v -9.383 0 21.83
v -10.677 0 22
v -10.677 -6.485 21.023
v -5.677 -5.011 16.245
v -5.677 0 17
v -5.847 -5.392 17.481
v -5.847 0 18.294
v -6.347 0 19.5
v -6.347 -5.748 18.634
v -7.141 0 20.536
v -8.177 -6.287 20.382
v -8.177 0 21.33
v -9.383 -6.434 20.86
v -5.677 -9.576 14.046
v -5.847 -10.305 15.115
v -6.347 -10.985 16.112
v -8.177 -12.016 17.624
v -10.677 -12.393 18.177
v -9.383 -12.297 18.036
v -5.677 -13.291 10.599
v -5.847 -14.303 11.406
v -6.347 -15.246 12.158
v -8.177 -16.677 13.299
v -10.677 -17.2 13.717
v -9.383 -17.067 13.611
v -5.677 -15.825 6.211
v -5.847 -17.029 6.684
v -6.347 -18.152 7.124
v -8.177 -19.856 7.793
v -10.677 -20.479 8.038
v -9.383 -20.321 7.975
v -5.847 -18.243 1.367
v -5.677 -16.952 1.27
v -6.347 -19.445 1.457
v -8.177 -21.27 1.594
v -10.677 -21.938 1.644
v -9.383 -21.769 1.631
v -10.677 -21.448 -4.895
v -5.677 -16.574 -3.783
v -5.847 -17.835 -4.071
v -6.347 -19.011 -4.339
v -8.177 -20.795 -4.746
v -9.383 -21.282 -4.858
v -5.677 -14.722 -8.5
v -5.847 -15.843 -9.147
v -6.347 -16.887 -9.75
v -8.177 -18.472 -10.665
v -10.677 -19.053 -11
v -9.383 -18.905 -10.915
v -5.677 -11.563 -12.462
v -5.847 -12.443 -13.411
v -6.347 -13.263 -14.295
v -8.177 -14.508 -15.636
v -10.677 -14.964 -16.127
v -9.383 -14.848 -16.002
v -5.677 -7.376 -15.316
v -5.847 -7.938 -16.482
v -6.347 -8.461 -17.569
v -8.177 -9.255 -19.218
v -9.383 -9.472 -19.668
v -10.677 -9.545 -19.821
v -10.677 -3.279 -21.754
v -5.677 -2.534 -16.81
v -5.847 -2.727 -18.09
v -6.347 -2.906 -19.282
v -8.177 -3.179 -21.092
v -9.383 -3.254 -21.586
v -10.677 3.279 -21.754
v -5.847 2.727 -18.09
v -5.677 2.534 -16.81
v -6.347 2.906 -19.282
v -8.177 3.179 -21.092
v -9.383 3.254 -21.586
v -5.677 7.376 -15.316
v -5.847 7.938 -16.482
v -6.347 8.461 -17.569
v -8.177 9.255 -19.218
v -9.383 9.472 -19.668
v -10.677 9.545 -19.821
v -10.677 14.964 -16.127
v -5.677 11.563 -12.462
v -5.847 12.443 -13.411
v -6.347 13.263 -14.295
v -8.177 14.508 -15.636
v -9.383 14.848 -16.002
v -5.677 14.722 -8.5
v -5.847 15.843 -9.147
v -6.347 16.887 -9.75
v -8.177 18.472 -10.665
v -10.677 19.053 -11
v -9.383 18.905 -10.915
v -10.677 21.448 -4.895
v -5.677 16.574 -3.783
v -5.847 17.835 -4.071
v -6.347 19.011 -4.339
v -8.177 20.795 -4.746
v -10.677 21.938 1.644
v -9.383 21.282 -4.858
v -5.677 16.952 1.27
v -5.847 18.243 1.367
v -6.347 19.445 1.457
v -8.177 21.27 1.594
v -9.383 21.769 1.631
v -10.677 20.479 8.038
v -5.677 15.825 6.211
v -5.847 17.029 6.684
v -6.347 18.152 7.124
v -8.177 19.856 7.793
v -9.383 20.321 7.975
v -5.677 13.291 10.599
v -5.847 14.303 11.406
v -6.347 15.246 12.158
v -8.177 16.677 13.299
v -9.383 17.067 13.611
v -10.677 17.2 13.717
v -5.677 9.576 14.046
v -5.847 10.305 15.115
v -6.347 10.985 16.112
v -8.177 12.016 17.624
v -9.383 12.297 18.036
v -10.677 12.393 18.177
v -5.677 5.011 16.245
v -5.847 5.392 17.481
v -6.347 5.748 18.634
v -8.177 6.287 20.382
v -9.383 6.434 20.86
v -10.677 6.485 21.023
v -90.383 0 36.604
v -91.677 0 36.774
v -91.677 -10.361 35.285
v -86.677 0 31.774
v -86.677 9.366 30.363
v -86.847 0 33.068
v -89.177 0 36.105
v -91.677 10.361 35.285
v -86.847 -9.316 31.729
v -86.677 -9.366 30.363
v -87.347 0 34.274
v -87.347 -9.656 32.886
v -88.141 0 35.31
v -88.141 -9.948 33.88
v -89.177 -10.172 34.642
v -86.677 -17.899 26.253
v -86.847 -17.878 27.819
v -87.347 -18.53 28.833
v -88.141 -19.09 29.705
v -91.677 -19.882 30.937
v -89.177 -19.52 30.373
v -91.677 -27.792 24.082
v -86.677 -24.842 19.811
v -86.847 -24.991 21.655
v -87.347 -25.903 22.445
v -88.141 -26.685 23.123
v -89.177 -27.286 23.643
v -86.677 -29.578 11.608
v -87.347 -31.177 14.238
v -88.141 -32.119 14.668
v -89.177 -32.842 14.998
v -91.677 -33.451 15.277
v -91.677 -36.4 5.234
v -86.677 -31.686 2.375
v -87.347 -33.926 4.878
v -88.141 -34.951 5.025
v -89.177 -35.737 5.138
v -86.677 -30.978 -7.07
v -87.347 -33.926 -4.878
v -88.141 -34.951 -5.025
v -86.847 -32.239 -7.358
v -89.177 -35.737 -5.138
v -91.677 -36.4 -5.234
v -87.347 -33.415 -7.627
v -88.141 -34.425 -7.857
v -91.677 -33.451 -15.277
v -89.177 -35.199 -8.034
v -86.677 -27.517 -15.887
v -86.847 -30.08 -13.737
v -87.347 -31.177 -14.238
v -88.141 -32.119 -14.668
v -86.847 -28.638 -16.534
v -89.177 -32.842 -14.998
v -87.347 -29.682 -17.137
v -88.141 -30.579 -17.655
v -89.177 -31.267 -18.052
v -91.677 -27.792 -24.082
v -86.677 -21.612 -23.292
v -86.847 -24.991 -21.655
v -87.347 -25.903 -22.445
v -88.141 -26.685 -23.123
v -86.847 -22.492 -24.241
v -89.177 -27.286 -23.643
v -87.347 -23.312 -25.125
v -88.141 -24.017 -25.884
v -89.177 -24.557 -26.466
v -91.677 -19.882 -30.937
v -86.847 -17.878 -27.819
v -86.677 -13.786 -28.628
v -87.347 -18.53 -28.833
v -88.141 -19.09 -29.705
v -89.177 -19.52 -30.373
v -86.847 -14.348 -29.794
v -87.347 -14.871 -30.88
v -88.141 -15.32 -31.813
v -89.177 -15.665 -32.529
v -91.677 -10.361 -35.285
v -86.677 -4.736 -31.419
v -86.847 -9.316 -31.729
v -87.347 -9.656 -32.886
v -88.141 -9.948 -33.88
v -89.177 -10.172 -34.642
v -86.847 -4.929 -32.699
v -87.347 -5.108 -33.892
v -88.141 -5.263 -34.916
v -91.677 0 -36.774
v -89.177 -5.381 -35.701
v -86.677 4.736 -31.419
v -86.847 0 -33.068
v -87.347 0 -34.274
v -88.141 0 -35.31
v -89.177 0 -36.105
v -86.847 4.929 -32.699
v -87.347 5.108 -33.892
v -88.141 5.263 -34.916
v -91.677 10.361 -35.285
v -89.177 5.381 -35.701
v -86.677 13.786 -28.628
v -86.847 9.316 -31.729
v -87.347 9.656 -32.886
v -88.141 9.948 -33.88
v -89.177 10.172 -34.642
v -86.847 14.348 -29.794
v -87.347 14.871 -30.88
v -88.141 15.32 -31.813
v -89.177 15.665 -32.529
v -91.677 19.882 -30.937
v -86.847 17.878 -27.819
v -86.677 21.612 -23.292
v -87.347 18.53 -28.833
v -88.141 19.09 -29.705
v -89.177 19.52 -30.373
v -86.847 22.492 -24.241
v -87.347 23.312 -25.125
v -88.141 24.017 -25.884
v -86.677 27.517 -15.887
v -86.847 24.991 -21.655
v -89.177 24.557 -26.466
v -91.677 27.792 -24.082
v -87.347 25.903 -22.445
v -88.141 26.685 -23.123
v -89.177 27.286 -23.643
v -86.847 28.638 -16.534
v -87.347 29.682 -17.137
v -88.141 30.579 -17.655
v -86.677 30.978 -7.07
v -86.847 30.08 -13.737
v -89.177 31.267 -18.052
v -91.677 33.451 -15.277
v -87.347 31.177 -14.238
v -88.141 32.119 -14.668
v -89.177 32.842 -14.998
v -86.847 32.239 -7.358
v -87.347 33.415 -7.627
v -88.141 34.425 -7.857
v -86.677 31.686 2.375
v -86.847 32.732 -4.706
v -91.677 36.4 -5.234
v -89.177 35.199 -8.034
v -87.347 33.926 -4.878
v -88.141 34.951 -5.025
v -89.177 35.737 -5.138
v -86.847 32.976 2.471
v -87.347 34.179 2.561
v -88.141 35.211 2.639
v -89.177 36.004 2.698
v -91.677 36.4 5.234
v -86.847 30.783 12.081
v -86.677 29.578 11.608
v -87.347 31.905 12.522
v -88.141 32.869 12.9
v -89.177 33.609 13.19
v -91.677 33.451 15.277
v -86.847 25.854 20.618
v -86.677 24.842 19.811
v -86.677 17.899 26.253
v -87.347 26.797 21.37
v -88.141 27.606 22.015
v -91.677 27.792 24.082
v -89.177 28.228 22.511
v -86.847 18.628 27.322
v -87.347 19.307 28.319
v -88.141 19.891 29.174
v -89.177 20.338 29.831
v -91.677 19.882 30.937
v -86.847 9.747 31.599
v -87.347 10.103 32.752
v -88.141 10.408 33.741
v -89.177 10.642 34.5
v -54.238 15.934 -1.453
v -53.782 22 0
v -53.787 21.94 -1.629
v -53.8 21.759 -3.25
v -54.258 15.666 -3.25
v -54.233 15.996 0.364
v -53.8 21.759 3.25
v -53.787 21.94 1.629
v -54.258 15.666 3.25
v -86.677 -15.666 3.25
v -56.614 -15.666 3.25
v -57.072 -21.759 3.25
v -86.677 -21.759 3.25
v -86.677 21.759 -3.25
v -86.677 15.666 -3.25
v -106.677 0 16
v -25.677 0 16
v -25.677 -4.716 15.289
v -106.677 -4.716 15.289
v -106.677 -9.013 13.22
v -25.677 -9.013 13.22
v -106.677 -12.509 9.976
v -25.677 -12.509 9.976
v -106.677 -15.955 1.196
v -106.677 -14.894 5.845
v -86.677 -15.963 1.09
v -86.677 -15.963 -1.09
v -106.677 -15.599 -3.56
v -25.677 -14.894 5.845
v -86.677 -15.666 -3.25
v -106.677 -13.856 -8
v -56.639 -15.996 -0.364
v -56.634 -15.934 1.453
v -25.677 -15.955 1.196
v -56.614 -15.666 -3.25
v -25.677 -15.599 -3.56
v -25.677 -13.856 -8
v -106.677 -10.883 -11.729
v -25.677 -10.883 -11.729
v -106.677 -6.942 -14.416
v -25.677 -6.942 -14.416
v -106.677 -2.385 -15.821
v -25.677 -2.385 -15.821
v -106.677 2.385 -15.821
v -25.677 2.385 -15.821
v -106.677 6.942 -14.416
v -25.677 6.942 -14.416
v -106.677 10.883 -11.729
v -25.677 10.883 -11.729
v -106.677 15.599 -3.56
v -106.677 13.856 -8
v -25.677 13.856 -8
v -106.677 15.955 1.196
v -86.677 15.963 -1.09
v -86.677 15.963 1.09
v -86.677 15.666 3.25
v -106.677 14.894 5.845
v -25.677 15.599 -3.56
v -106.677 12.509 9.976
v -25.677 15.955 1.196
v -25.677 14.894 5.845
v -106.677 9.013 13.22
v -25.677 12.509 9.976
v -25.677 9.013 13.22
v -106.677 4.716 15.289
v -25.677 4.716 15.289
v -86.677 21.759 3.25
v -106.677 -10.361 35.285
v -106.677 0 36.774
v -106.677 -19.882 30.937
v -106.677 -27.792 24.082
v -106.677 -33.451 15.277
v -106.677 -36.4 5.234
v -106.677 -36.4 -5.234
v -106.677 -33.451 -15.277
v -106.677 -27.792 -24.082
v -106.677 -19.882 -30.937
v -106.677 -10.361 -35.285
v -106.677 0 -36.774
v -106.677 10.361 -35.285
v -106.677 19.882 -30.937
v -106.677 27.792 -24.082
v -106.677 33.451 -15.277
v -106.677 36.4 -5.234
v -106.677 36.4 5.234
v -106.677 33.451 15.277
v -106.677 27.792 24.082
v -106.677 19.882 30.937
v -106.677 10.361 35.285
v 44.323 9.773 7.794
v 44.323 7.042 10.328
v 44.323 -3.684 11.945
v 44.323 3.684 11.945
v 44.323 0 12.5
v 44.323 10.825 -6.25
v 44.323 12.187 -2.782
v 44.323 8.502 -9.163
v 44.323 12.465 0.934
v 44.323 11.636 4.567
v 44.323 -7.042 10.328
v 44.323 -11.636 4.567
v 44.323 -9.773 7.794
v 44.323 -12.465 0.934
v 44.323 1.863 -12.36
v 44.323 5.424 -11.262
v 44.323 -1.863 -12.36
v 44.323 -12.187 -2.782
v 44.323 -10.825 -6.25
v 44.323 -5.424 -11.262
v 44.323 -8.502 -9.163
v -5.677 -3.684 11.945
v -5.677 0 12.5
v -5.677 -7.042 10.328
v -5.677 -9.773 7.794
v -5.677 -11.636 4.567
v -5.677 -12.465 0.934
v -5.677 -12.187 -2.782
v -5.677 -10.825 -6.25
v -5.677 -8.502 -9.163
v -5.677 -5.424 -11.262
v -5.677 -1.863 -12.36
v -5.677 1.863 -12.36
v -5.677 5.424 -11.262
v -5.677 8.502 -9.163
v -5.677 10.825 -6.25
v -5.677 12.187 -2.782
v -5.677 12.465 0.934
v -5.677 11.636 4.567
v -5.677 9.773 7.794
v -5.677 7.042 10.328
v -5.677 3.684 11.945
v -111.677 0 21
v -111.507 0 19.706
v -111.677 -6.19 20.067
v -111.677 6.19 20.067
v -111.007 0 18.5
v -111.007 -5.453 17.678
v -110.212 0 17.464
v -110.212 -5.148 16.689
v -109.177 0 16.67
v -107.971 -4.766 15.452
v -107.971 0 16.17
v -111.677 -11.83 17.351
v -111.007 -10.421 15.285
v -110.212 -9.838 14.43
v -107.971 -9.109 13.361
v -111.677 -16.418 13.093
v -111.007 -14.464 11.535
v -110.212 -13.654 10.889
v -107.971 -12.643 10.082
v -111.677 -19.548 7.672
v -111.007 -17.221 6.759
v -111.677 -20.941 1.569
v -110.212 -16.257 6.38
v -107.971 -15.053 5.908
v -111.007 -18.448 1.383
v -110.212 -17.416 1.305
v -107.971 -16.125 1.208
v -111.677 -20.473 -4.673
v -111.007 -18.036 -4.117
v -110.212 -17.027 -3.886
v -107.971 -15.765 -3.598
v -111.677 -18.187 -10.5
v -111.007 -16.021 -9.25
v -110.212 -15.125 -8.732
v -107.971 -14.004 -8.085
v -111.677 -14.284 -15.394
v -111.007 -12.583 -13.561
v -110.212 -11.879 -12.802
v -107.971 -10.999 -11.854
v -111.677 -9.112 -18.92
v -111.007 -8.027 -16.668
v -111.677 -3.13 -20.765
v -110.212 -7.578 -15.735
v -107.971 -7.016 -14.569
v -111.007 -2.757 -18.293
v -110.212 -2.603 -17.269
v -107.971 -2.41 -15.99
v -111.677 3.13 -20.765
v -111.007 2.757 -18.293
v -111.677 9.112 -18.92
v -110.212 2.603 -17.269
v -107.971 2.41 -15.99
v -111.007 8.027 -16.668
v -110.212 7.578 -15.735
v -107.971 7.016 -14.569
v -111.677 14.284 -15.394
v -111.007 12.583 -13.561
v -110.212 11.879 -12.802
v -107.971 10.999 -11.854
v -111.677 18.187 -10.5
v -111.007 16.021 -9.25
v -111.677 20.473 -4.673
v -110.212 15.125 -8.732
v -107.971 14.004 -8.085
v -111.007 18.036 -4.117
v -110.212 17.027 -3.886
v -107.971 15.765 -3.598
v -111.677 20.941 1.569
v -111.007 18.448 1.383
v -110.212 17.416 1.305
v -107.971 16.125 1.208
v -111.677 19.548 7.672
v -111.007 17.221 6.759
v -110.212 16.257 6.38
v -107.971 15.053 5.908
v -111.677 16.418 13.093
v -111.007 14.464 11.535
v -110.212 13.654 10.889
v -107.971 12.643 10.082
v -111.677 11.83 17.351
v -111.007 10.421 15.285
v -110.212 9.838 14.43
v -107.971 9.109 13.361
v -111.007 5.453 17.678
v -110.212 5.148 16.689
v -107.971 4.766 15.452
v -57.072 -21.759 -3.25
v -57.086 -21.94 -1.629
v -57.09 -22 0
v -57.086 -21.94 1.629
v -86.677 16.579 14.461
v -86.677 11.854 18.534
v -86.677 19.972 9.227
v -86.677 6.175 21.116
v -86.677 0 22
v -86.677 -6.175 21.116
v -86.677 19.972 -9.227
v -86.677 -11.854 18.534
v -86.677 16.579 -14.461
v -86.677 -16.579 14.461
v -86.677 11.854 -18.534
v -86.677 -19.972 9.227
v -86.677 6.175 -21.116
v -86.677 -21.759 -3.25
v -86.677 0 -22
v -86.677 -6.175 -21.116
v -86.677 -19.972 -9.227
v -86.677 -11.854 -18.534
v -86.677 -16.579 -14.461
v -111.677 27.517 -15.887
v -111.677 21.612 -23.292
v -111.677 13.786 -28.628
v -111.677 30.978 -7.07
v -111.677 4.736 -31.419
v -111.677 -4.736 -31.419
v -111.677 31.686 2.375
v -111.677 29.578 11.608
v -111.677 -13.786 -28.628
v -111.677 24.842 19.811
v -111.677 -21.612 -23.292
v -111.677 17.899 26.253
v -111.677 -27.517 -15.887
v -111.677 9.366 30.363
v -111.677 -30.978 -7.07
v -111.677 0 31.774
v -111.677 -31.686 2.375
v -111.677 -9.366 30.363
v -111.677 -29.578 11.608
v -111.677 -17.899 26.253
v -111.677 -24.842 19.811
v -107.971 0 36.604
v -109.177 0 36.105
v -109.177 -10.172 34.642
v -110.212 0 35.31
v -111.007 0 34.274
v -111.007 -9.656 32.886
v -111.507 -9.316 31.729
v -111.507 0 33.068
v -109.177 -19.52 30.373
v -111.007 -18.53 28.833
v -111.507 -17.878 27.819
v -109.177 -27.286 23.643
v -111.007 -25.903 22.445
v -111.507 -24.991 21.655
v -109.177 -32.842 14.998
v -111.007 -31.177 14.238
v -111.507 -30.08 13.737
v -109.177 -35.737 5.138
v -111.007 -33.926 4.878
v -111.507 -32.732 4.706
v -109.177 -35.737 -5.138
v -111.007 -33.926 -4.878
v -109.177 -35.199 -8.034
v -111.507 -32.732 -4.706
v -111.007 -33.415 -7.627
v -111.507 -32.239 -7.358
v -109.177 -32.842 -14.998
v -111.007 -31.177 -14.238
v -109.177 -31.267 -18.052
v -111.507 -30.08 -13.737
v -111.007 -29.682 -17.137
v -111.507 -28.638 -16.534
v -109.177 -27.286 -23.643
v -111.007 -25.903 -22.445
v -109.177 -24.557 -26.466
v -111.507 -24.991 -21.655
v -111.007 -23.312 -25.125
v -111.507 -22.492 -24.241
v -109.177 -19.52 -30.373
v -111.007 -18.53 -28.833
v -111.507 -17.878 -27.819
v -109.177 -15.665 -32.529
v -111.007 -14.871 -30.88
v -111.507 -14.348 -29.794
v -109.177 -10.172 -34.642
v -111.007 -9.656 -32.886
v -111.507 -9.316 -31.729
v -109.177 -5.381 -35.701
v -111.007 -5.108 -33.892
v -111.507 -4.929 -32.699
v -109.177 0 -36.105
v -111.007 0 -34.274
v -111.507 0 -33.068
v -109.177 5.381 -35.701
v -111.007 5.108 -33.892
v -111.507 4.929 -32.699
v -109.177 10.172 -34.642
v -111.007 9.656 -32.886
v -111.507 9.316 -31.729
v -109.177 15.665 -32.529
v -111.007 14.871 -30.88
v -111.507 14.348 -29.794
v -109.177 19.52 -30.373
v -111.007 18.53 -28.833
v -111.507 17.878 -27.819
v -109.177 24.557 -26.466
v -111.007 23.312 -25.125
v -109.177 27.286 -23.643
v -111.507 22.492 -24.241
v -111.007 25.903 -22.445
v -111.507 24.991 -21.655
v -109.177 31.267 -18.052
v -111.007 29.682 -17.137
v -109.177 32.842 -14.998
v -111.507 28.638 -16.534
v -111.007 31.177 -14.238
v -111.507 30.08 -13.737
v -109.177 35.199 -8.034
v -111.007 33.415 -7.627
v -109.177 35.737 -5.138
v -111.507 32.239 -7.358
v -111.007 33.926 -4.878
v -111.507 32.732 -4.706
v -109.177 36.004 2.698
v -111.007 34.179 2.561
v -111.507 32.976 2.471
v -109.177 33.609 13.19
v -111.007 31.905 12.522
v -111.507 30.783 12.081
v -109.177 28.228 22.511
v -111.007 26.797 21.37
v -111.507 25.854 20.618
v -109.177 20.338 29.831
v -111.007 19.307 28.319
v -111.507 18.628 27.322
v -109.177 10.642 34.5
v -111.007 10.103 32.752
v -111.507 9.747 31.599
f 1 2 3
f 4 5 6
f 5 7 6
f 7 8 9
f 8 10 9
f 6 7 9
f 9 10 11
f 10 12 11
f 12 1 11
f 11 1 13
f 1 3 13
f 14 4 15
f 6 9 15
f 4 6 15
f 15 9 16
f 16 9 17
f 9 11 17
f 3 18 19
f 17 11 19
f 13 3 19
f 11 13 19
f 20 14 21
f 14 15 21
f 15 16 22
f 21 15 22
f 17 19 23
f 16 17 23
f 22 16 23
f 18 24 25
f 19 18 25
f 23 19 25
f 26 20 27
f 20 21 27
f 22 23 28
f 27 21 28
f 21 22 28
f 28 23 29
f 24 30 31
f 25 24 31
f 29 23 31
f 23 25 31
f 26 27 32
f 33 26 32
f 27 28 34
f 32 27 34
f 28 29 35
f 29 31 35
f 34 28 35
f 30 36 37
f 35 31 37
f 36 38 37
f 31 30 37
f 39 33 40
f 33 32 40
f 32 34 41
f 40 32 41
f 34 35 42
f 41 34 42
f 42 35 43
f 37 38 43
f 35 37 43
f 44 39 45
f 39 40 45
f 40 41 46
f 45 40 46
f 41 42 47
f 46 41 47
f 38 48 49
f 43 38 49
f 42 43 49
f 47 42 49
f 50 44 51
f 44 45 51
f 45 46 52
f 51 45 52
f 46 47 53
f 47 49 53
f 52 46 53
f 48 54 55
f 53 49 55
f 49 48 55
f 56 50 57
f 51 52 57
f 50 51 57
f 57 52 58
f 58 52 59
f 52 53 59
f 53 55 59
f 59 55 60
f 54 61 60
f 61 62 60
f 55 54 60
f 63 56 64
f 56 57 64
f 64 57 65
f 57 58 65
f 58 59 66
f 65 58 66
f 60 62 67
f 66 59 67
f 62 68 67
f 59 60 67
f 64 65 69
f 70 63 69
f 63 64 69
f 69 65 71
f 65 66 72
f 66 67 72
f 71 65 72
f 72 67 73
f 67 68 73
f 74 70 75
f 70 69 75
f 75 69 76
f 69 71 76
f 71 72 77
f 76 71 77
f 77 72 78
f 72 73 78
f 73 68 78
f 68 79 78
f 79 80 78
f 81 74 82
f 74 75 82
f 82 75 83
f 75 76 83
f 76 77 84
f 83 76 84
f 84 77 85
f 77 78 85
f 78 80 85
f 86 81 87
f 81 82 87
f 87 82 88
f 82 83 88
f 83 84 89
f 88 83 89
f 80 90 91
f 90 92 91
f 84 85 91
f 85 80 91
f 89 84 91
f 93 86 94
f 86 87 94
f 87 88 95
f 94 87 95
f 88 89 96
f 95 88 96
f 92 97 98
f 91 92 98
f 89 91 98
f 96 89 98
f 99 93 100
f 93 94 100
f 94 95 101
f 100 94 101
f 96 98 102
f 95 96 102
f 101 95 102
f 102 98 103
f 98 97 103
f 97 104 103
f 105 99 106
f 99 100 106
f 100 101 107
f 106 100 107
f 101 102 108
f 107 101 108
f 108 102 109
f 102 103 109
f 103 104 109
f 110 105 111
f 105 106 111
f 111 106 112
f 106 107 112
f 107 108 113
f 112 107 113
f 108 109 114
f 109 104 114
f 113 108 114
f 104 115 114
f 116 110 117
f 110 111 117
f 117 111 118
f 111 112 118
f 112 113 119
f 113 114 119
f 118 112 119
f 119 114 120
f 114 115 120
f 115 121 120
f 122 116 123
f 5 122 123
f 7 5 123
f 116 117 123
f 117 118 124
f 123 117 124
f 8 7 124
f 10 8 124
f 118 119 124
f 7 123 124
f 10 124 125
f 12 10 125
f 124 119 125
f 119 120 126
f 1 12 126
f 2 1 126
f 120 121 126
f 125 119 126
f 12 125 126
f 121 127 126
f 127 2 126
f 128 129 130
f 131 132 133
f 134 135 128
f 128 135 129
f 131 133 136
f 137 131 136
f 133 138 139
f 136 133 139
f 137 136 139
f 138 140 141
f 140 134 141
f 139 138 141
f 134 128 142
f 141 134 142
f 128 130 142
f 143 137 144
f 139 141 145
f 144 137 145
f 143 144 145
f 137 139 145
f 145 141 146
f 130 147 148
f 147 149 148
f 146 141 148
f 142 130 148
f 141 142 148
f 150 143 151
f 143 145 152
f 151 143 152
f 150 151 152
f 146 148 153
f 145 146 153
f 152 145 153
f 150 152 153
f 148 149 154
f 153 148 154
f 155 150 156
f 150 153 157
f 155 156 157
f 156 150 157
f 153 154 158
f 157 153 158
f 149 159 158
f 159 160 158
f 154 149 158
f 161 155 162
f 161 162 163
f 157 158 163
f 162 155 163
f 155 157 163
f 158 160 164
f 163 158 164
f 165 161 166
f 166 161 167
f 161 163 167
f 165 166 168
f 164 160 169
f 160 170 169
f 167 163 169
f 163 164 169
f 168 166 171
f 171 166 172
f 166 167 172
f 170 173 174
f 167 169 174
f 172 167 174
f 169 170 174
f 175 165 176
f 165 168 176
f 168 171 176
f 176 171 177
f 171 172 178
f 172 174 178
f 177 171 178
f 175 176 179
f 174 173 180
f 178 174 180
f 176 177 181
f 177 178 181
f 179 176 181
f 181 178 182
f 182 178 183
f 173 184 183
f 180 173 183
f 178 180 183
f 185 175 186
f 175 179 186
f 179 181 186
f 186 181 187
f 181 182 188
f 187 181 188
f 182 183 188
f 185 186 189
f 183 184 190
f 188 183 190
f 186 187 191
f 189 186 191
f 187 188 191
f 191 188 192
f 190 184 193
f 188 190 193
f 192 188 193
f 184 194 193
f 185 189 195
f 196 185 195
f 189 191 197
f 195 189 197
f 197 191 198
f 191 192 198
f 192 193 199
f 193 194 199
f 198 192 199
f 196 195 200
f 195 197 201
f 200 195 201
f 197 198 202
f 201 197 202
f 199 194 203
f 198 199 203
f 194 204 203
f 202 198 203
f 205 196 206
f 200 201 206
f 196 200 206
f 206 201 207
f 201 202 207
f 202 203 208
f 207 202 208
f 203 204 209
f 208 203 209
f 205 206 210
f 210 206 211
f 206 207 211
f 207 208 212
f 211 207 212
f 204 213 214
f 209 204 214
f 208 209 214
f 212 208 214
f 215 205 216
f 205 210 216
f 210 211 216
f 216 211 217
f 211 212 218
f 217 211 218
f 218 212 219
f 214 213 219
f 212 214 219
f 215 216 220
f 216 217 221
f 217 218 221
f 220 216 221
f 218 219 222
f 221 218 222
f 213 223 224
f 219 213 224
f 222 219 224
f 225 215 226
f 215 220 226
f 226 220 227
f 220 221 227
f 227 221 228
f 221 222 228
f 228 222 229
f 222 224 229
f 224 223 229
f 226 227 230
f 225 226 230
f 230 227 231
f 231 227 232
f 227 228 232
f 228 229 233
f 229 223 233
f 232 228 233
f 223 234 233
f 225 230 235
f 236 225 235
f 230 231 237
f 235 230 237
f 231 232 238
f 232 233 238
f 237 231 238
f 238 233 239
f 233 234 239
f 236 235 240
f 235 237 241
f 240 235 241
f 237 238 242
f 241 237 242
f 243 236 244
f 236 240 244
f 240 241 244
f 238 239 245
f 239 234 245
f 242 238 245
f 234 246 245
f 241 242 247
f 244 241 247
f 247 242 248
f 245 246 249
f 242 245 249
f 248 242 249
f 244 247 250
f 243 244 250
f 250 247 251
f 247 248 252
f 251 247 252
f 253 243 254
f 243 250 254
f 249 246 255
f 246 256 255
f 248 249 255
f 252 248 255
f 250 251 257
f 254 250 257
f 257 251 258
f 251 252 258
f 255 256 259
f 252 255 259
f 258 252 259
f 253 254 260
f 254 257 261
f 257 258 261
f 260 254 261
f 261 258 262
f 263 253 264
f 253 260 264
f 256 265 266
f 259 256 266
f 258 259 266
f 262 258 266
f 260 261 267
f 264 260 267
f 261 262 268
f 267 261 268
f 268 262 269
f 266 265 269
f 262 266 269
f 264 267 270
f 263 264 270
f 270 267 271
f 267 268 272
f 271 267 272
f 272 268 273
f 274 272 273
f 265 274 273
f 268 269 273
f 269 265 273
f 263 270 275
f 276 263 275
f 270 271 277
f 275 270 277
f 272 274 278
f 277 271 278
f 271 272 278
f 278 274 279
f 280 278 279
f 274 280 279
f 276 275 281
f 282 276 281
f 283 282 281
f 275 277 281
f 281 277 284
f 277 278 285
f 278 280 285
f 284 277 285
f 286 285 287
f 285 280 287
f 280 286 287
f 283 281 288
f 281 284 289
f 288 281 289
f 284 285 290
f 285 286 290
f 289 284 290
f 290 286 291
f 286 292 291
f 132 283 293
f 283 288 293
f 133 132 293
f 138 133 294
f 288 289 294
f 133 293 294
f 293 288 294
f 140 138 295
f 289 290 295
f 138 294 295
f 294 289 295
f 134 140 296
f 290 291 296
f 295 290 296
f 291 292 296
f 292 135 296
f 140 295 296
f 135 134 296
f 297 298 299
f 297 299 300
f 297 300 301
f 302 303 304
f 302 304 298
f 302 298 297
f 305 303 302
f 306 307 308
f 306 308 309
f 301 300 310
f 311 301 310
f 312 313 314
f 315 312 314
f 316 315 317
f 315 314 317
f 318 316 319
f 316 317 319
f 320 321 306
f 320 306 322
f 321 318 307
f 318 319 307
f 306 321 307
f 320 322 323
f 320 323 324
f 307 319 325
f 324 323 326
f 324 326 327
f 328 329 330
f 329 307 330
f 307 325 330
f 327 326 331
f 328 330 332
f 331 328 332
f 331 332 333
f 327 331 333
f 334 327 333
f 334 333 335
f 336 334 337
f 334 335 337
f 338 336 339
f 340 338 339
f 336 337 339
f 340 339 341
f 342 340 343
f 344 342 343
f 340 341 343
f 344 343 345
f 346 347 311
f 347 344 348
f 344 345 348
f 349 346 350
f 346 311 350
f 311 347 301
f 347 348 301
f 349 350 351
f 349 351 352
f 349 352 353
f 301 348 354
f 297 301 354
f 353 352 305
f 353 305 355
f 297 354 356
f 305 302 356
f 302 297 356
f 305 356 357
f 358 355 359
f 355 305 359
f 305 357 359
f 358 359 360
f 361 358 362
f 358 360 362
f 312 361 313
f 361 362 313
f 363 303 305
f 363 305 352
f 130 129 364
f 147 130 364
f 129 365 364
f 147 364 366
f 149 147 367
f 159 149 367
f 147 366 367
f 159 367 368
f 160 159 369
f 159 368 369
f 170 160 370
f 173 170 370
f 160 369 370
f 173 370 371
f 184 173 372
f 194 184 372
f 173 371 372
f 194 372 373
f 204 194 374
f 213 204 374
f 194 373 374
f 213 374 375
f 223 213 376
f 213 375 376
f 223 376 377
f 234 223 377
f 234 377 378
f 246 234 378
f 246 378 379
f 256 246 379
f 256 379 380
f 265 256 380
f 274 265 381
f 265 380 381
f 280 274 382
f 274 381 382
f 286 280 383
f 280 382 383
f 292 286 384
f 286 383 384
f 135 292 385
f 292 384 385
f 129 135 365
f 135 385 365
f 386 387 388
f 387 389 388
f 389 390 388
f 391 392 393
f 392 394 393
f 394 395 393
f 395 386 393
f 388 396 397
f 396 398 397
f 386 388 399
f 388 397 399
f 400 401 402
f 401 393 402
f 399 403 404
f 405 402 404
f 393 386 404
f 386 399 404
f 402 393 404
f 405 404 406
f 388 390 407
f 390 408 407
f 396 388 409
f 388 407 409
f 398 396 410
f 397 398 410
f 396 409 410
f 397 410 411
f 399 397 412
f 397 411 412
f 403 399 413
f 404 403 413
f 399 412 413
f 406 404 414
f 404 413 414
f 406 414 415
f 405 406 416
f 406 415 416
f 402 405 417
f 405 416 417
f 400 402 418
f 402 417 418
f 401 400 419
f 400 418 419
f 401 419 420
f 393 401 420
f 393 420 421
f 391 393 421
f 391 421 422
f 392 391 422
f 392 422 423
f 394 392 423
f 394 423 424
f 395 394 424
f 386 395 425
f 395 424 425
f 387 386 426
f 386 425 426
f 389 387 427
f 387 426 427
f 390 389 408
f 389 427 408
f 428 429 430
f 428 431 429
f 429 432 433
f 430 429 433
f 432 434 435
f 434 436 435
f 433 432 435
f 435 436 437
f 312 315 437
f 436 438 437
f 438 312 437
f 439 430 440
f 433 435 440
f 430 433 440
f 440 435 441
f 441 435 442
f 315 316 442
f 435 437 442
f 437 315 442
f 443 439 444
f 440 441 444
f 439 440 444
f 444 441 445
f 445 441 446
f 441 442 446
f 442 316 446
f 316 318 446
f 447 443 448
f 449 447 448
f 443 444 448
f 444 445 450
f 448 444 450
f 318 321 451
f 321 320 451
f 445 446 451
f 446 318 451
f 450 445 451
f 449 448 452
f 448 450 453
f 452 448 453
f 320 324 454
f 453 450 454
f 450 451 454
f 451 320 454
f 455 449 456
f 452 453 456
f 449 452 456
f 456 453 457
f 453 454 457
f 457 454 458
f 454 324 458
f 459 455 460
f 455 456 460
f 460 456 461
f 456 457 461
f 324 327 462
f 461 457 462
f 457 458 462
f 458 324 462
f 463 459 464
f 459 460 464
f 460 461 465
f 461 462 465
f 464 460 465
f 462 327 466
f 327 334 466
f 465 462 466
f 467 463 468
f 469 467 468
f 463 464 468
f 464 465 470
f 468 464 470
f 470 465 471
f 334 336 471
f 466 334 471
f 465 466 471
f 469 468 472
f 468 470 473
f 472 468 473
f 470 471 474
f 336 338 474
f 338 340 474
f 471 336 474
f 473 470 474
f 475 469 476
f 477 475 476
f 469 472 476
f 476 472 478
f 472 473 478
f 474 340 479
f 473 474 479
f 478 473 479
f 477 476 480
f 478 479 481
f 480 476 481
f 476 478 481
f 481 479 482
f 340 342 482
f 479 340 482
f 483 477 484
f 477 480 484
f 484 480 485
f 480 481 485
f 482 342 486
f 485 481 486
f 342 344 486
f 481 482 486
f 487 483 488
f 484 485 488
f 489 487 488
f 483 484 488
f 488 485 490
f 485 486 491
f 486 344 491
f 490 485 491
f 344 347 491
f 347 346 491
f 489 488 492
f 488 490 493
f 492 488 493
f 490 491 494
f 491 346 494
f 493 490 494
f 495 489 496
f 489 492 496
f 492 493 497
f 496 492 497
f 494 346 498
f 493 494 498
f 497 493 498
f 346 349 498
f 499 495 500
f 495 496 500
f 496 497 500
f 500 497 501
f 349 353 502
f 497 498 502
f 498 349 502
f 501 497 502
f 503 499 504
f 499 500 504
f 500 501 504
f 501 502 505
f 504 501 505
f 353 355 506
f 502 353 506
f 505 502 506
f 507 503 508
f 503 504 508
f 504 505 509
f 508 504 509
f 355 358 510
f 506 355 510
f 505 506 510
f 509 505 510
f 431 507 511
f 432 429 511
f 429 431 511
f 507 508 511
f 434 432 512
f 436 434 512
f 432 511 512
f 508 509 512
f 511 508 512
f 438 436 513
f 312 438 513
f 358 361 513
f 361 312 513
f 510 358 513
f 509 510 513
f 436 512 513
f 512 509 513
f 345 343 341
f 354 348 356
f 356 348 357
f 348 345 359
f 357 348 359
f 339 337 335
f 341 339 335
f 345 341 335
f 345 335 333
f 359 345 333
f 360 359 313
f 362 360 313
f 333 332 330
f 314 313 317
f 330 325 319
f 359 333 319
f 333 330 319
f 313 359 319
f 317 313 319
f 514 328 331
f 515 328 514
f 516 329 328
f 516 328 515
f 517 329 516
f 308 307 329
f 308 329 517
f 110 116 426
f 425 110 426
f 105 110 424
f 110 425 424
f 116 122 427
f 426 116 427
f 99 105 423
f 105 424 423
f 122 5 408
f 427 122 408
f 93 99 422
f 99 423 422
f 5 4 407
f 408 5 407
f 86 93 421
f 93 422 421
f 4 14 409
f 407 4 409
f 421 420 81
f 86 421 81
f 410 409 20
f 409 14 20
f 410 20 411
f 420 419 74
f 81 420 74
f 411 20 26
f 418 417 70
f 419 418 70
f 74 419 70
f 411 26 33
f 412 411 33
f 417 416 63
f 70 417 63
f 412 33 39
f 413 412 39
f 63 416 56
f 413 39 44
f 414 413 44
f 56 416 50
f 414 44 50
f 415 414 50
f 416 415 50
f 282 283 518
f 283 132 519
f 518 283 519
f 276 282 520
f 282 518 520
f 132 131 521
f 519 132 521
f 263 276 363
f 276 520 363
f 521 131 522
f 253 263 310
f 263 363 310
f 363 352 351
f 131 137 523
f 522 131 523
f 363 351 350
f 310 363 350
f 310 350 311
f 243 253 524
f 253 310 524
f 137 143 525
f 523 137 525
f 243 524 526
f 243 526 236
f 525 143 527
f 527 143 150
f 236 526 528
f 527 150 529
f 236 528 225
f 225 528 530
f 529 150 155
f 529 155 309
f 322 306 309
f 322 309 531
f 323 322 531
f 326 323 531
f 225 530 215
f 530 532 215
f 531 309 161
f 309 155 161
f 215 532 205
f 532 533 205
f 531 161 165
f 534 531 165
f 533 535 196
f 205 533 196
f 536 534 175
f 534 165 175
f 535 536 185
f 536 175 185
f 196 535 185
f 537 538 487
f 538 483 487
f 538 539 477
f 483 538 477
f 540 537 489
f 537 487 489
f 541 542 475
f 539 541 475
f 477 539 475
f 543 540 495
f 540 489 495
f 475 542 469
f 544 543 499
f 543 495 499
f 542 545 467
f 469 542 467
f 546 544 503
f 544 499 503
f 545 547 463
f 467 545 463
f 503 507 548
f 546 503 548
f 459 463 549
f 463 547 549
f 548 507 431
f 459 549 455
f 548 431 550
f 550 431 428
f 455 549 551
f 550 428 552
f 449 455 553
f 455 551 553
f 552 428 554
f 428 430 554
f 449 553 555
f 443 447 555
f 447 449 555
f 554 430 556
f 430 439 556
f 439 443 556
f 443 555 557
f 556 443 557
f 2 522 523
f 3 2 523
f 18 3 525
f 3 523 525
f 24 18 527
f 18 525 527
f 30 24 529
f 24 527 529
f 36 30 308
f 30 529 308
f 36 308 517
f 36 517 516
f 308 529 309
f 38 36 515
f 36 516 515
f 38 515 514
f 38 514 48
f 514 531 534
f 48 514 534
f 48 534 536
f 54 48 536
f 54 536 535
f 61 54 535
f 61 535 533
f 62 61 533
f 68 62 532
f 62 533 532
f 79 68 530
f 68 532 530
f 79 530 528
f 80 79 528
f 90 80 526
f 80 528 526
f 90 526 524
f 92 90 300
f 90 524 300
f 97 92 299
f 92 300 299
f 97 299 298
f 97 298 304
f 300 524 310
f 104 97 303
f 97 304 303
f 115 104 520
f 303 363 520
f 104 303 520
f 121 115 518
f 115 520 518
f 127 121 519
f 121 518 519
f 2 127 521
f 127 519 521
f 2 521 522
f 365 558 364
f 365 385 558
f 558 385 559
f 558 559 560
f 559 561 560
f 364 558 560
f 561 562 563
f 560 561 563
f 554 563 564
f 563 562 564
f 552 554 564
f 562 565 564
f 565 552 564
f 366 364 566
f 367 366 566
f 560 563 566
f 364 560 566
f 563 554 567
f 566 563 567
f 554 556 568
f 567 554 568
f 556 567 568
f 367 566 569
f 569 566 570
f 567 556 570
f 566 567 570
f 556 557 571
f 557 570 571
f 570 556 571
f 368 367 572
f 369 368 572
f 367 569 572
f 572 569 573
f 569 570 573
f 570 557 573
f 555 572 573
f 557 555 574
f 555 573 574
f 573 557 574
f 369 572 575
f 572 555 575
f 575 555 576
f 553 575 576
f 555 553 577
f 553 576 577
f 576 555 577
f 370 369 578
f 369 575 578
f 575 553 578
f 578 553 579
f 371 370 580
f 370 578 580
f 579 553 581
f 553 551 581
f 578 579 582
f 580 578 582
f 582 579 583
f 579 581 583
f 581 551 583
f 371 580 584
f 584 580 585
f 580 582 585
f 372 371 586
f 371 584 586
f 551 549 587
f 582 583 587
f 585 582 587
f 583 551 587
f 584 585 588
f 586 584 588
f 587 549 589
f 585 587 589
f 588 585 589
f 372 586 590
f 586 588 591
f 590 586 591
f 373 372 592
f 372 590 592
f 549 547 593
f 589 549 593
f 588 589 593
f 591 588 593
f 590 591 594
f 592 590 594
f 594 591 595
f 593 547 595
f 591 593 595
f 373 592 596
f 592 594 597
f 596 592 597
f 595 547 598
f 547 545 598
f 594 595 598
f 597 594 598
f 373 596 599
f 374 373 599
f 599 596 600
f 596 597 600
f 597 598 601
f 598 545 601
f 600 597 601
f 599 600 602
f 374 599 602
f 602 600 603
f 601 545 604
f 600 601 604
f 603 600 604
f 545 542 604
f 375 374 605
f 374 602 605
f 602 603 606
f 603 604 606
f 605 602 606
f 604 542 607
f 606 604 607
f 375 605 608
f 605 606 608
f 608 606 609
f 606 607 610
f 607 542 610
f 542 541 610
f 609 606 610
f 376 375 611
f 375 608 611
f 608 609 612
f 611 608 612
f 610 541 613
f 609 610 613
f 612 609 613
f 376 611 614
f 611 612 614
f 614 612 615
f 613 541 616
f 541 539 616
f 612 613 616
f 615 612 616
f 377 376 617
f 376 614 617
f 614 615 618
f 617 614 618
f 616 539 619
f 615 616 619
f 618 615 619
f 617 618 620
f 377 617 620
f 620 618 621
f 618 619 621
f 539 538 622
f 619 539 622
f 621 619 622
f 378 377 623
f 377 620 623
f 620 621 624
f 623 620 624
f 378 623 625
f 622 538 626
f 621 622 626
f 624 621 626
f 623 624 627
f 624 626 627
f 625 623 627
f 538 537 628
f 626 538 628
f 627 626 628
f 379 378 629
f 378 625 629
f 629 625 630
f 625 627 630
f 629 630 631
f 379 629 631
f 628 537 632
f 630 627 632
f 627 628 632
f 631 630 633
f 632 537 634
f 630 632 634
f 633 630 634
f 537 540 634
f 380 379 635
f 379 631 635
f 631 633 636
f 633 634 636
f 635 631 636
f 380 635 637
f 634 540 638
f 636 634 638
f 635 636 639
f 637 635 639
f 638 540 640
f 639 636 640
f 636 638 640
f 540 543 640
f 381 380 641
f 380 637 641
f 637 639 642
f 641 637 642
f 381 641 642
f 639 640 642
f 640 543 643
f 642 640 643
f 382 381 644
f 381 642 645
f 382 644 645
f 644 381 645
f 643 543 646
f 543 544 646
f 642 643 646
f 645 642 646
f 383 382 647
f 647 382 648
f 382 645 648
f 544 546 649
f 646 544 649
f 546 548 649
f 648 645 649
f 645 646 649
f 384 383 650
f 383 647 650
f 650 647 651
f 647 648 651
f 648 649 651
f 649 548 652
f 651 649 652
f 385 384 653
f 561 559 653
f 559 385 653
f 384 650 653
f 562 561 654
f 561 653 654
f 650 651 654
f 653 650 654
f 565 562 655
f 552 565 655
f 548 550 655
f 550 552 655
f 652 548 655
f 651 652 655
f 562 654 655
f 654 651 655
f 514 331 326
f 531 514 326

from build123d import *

# Parameters (mm, degrees)
CUT_EXTRUDE1_DEPTH = 3.25


with BuildPart() as part:
    # Sketch1 → Revolve3 (revolve)
    with BuildSketch(Plane(origin=(0, 0, 0), x_dir=(1, 0, 0), z_dir=(0, 1, 0)), mode=Mode.PRIVATE) as revolve3_sk:
        with BuildLine():
            Line((-25.676880223, 0), (44.323119777, 0))
            Line((44.323119777, 0), (44.323119777, 12.5))
            Line((44.323119777, 12.5), (-5.676880223, 12.5))
            Line((-5.676880223, 12.5), (-5.676880223, 17))
            ThreePointArc((-5.676880223, 17), (-7.141346317, 20.535533906), (-10.676880223, 22))
            Line((-10.676880223, 22), (-86.676880223, 22))
            Line((-86.676880223, 22), (-86.676880223, 31.774373259))
            ThreePointArc((-86.676880223, 31.774373259), (-88.141346317, 35.309907165), (-91.676880223, 36.774373259))
            Line((-91.676880223, 36.774373259), (-106.676880223, 36.774373259))
            ThreePointArc((-106.676880223, 36.774373259), (-110.212414129, 35.309907165), (-111.676880223, 31.774373259))
            Line((-111.676880223, 31.774373259), (-111.676880223, 21))
            ThreePointArc((-111.676880223, 21), (-110.212414129, 17.464466094), (-106.676880223, 16))
            Line((-106.676880223, 16), (-25.676880223, 16))
            Line((-25.676880223, 16), (-25.676880223, 0))
        make_face()
    revolve(revolve3_sk.sketch.rotate(Axis((-25.676880223, 0, 0), (1, 0, 0)), 180), axis=Axis((-25.676880223, 0, 0), (1, 0, 0)))

    # Sketch3 → Cut-Extrude1 (cut, symmetric)
    with BuildSketch(Plane.XY):
        Polygon((-86.676880223, 0), (-86.676880223, 50), (-51.676880223, 50), (-59.676880223, -56.407142019), (-86.676880223, -56.407142019), align=None)
    extrude(amount=CUT_EXTRUDE1_DEPTH, both=True, mode=Mode.SUBTRACT)


solid = part.part
